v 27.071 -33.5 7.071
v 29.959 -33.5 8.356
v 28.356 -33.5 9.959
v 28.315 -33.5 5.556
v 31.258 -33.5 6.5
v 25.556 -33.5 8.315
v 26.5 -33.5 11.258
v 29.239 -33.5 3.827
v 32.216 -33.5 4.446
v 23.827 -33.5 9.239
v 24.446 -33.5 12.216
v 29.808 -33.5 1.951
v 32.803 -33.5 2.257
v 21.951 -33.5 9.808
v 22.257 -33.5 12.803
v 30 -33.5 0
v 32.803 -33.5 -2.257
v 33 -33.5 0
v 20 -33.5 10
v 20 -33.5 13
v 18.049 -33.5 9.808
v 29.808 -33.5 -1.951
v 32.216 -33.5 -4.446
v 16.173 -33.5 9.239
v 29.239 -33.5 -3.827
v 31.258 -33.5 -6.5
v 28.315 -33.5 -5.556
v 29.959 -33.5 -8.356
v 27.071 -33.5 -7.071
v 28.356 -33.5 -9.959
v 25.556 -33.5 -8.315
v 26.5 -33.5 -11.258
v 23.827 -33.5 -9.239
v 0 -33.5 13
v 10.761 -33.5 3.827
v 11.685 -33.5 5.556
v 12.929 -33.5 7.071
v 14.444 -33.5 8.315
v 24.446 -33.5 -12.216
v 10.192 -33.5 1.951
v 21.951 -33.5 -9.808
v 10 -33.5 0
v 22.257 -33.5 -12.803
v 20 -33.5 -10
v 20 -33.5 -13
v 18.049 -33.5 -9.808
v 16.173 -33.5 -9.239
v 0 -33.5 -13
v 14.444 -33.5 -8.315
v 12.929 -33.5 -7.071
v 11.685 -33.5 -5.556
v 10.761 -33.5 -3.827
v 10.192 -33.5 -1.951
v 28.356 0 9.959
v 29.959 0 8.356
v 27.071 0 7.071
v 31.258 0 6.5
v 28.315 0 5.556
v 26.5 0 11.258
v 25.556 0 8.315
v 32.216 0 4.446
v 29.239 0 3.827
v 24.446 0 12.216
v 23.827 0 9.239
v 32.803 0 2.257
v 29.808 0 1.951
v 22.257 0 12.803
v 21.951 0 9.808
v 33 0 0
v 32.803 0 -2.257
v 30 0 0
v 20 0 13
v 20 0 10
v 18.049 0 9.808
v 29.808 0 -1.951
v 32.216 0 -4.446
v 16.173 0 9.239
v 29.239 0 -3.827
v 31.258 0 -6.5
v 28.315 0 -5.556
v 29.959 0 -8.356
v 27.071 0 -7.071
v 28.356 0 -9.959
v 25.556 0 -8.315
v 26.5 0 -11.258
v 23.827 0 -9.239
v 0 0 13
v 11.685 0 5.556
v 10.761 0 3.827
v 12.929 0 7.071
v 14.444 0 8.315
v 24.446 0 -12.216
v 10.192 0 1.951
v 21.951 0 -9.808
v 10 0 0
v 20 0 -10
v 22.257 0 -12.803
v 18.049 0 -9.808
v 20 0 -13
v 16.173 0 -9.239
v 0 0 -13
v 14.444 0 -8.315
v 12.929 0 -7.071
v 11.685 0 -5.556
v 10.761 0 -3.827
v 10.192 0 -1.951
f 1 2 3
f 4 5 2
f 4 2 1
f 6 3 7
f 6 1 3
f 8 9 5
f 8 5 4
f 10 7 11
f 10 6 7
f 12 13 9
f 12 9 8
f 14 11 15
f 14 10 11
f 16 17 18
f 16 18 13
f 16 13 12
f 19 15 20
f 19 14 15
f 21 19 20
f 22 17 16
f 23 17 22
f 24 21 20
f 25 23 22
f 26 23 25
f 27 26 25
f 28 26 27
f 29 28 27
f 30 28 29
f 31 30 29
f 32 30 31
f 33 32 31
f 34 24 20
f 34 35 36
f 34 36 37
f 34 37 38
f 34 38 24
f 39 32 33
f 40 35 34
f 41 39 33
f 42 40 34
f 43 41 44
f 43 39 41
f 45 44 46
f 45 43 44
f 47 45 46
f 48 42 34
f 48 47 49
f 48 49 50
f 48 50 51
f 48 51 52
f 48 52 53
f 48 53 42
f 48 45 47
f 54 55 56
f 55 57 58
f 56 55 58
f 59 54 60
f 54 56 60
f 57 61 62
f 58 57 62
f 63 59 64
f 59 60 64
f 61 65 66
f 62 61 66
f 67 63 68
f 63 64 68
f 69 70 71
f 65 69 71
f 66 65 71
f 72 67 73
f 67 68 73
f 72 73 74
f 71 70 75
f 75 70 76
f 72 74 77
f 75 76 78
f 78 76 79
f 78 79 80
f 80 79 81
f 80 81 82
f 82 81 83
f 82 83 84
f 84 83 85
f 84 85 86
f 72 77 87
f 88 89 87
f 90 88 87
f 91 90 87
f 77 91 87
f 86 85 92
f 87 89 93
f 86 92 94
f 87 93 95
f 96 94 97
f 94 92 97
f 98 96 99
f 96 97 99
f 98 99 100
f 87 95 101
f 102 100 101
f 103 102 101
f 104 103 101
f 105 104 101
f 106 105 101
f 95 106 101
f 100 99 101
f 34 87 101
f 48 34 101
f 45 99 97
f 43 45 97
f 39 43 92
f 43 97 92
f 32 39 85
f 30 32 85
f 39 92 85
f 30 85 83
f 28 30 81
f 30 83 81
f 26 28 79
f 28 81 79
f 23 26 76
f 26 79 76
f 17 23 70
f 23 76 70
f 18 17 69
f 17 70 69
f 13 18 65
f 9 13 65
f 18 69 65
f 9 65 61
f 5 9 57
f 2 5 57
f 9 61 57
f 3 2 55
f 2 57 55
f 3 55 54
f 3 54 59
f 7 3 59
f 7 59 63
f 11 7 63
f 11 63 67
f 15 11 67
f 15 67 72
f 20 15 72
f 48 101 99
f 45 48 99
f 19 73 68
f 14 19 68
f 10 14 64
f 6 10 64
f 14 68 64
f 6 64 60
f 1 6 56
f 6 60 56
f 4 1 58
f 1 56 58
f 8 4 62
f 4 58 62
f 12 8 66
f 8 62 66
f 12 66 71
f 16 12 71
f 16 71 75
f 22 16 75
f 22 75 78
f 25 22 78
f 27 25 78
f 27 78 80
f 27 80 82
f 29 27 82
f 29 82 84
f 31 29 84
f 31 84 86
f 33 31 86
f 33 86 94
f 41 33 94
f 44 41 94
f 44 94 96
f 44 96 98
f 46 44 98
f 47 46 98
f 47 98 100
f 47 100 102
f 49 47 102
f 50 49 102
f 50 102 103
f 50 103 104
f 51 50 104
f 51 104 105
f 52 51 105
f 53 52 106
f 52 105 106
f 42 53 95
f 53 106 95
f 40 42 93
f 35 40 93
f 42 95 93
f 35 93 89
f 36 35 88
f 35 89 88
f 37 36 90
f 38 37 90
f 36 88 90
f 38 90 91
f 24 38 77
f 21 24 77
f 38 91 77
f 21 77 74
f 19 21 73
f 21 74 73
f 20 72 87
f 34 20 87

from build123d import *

# Parameters (mm, degrees)
BOSS_EXTRUDE2_DEPTH = 33.5
SKETCH2_R           = 10
CUT_EXTRUDE1_DEPTH  = 49.787805854


with BuildPart() as part:
    # Sketch1 → Boss-Extrude2 (new body)
    with BuildSketch(Plane(origin=(0, 0, 0), x_dir=(1, 0, 0), z_dir=(0, 1, 0))):
        with BuildLine():
            Line((0, 0), (0, 13))
            Line((0, 13), (20, 13))
            ThreePointArc((20, 13), (33, 0), (20, -13))
            Line((20, -13), (0, -13))
            Line((0, -13), (0, 0))
        make_face()
    extrude(amount=-BOSS_EXTRUDE2_DEPTH)

    # Sketch2 → Cut-Extrude1 (cut, through all)
    with BuildSketch(Plane(origin=(0, 0, 0), x_dir=(1, 0, 0), z_dir=(0, 1, 0))):
        with Locations(Location((20, 0, 0), (0, 0, 270))):
            Circle(SKETCH2_R)
    extrude(amount=-CUT_EXTRUDE1_DEPTH, mode=Mode.SUBTRACT)


solid = part.part
